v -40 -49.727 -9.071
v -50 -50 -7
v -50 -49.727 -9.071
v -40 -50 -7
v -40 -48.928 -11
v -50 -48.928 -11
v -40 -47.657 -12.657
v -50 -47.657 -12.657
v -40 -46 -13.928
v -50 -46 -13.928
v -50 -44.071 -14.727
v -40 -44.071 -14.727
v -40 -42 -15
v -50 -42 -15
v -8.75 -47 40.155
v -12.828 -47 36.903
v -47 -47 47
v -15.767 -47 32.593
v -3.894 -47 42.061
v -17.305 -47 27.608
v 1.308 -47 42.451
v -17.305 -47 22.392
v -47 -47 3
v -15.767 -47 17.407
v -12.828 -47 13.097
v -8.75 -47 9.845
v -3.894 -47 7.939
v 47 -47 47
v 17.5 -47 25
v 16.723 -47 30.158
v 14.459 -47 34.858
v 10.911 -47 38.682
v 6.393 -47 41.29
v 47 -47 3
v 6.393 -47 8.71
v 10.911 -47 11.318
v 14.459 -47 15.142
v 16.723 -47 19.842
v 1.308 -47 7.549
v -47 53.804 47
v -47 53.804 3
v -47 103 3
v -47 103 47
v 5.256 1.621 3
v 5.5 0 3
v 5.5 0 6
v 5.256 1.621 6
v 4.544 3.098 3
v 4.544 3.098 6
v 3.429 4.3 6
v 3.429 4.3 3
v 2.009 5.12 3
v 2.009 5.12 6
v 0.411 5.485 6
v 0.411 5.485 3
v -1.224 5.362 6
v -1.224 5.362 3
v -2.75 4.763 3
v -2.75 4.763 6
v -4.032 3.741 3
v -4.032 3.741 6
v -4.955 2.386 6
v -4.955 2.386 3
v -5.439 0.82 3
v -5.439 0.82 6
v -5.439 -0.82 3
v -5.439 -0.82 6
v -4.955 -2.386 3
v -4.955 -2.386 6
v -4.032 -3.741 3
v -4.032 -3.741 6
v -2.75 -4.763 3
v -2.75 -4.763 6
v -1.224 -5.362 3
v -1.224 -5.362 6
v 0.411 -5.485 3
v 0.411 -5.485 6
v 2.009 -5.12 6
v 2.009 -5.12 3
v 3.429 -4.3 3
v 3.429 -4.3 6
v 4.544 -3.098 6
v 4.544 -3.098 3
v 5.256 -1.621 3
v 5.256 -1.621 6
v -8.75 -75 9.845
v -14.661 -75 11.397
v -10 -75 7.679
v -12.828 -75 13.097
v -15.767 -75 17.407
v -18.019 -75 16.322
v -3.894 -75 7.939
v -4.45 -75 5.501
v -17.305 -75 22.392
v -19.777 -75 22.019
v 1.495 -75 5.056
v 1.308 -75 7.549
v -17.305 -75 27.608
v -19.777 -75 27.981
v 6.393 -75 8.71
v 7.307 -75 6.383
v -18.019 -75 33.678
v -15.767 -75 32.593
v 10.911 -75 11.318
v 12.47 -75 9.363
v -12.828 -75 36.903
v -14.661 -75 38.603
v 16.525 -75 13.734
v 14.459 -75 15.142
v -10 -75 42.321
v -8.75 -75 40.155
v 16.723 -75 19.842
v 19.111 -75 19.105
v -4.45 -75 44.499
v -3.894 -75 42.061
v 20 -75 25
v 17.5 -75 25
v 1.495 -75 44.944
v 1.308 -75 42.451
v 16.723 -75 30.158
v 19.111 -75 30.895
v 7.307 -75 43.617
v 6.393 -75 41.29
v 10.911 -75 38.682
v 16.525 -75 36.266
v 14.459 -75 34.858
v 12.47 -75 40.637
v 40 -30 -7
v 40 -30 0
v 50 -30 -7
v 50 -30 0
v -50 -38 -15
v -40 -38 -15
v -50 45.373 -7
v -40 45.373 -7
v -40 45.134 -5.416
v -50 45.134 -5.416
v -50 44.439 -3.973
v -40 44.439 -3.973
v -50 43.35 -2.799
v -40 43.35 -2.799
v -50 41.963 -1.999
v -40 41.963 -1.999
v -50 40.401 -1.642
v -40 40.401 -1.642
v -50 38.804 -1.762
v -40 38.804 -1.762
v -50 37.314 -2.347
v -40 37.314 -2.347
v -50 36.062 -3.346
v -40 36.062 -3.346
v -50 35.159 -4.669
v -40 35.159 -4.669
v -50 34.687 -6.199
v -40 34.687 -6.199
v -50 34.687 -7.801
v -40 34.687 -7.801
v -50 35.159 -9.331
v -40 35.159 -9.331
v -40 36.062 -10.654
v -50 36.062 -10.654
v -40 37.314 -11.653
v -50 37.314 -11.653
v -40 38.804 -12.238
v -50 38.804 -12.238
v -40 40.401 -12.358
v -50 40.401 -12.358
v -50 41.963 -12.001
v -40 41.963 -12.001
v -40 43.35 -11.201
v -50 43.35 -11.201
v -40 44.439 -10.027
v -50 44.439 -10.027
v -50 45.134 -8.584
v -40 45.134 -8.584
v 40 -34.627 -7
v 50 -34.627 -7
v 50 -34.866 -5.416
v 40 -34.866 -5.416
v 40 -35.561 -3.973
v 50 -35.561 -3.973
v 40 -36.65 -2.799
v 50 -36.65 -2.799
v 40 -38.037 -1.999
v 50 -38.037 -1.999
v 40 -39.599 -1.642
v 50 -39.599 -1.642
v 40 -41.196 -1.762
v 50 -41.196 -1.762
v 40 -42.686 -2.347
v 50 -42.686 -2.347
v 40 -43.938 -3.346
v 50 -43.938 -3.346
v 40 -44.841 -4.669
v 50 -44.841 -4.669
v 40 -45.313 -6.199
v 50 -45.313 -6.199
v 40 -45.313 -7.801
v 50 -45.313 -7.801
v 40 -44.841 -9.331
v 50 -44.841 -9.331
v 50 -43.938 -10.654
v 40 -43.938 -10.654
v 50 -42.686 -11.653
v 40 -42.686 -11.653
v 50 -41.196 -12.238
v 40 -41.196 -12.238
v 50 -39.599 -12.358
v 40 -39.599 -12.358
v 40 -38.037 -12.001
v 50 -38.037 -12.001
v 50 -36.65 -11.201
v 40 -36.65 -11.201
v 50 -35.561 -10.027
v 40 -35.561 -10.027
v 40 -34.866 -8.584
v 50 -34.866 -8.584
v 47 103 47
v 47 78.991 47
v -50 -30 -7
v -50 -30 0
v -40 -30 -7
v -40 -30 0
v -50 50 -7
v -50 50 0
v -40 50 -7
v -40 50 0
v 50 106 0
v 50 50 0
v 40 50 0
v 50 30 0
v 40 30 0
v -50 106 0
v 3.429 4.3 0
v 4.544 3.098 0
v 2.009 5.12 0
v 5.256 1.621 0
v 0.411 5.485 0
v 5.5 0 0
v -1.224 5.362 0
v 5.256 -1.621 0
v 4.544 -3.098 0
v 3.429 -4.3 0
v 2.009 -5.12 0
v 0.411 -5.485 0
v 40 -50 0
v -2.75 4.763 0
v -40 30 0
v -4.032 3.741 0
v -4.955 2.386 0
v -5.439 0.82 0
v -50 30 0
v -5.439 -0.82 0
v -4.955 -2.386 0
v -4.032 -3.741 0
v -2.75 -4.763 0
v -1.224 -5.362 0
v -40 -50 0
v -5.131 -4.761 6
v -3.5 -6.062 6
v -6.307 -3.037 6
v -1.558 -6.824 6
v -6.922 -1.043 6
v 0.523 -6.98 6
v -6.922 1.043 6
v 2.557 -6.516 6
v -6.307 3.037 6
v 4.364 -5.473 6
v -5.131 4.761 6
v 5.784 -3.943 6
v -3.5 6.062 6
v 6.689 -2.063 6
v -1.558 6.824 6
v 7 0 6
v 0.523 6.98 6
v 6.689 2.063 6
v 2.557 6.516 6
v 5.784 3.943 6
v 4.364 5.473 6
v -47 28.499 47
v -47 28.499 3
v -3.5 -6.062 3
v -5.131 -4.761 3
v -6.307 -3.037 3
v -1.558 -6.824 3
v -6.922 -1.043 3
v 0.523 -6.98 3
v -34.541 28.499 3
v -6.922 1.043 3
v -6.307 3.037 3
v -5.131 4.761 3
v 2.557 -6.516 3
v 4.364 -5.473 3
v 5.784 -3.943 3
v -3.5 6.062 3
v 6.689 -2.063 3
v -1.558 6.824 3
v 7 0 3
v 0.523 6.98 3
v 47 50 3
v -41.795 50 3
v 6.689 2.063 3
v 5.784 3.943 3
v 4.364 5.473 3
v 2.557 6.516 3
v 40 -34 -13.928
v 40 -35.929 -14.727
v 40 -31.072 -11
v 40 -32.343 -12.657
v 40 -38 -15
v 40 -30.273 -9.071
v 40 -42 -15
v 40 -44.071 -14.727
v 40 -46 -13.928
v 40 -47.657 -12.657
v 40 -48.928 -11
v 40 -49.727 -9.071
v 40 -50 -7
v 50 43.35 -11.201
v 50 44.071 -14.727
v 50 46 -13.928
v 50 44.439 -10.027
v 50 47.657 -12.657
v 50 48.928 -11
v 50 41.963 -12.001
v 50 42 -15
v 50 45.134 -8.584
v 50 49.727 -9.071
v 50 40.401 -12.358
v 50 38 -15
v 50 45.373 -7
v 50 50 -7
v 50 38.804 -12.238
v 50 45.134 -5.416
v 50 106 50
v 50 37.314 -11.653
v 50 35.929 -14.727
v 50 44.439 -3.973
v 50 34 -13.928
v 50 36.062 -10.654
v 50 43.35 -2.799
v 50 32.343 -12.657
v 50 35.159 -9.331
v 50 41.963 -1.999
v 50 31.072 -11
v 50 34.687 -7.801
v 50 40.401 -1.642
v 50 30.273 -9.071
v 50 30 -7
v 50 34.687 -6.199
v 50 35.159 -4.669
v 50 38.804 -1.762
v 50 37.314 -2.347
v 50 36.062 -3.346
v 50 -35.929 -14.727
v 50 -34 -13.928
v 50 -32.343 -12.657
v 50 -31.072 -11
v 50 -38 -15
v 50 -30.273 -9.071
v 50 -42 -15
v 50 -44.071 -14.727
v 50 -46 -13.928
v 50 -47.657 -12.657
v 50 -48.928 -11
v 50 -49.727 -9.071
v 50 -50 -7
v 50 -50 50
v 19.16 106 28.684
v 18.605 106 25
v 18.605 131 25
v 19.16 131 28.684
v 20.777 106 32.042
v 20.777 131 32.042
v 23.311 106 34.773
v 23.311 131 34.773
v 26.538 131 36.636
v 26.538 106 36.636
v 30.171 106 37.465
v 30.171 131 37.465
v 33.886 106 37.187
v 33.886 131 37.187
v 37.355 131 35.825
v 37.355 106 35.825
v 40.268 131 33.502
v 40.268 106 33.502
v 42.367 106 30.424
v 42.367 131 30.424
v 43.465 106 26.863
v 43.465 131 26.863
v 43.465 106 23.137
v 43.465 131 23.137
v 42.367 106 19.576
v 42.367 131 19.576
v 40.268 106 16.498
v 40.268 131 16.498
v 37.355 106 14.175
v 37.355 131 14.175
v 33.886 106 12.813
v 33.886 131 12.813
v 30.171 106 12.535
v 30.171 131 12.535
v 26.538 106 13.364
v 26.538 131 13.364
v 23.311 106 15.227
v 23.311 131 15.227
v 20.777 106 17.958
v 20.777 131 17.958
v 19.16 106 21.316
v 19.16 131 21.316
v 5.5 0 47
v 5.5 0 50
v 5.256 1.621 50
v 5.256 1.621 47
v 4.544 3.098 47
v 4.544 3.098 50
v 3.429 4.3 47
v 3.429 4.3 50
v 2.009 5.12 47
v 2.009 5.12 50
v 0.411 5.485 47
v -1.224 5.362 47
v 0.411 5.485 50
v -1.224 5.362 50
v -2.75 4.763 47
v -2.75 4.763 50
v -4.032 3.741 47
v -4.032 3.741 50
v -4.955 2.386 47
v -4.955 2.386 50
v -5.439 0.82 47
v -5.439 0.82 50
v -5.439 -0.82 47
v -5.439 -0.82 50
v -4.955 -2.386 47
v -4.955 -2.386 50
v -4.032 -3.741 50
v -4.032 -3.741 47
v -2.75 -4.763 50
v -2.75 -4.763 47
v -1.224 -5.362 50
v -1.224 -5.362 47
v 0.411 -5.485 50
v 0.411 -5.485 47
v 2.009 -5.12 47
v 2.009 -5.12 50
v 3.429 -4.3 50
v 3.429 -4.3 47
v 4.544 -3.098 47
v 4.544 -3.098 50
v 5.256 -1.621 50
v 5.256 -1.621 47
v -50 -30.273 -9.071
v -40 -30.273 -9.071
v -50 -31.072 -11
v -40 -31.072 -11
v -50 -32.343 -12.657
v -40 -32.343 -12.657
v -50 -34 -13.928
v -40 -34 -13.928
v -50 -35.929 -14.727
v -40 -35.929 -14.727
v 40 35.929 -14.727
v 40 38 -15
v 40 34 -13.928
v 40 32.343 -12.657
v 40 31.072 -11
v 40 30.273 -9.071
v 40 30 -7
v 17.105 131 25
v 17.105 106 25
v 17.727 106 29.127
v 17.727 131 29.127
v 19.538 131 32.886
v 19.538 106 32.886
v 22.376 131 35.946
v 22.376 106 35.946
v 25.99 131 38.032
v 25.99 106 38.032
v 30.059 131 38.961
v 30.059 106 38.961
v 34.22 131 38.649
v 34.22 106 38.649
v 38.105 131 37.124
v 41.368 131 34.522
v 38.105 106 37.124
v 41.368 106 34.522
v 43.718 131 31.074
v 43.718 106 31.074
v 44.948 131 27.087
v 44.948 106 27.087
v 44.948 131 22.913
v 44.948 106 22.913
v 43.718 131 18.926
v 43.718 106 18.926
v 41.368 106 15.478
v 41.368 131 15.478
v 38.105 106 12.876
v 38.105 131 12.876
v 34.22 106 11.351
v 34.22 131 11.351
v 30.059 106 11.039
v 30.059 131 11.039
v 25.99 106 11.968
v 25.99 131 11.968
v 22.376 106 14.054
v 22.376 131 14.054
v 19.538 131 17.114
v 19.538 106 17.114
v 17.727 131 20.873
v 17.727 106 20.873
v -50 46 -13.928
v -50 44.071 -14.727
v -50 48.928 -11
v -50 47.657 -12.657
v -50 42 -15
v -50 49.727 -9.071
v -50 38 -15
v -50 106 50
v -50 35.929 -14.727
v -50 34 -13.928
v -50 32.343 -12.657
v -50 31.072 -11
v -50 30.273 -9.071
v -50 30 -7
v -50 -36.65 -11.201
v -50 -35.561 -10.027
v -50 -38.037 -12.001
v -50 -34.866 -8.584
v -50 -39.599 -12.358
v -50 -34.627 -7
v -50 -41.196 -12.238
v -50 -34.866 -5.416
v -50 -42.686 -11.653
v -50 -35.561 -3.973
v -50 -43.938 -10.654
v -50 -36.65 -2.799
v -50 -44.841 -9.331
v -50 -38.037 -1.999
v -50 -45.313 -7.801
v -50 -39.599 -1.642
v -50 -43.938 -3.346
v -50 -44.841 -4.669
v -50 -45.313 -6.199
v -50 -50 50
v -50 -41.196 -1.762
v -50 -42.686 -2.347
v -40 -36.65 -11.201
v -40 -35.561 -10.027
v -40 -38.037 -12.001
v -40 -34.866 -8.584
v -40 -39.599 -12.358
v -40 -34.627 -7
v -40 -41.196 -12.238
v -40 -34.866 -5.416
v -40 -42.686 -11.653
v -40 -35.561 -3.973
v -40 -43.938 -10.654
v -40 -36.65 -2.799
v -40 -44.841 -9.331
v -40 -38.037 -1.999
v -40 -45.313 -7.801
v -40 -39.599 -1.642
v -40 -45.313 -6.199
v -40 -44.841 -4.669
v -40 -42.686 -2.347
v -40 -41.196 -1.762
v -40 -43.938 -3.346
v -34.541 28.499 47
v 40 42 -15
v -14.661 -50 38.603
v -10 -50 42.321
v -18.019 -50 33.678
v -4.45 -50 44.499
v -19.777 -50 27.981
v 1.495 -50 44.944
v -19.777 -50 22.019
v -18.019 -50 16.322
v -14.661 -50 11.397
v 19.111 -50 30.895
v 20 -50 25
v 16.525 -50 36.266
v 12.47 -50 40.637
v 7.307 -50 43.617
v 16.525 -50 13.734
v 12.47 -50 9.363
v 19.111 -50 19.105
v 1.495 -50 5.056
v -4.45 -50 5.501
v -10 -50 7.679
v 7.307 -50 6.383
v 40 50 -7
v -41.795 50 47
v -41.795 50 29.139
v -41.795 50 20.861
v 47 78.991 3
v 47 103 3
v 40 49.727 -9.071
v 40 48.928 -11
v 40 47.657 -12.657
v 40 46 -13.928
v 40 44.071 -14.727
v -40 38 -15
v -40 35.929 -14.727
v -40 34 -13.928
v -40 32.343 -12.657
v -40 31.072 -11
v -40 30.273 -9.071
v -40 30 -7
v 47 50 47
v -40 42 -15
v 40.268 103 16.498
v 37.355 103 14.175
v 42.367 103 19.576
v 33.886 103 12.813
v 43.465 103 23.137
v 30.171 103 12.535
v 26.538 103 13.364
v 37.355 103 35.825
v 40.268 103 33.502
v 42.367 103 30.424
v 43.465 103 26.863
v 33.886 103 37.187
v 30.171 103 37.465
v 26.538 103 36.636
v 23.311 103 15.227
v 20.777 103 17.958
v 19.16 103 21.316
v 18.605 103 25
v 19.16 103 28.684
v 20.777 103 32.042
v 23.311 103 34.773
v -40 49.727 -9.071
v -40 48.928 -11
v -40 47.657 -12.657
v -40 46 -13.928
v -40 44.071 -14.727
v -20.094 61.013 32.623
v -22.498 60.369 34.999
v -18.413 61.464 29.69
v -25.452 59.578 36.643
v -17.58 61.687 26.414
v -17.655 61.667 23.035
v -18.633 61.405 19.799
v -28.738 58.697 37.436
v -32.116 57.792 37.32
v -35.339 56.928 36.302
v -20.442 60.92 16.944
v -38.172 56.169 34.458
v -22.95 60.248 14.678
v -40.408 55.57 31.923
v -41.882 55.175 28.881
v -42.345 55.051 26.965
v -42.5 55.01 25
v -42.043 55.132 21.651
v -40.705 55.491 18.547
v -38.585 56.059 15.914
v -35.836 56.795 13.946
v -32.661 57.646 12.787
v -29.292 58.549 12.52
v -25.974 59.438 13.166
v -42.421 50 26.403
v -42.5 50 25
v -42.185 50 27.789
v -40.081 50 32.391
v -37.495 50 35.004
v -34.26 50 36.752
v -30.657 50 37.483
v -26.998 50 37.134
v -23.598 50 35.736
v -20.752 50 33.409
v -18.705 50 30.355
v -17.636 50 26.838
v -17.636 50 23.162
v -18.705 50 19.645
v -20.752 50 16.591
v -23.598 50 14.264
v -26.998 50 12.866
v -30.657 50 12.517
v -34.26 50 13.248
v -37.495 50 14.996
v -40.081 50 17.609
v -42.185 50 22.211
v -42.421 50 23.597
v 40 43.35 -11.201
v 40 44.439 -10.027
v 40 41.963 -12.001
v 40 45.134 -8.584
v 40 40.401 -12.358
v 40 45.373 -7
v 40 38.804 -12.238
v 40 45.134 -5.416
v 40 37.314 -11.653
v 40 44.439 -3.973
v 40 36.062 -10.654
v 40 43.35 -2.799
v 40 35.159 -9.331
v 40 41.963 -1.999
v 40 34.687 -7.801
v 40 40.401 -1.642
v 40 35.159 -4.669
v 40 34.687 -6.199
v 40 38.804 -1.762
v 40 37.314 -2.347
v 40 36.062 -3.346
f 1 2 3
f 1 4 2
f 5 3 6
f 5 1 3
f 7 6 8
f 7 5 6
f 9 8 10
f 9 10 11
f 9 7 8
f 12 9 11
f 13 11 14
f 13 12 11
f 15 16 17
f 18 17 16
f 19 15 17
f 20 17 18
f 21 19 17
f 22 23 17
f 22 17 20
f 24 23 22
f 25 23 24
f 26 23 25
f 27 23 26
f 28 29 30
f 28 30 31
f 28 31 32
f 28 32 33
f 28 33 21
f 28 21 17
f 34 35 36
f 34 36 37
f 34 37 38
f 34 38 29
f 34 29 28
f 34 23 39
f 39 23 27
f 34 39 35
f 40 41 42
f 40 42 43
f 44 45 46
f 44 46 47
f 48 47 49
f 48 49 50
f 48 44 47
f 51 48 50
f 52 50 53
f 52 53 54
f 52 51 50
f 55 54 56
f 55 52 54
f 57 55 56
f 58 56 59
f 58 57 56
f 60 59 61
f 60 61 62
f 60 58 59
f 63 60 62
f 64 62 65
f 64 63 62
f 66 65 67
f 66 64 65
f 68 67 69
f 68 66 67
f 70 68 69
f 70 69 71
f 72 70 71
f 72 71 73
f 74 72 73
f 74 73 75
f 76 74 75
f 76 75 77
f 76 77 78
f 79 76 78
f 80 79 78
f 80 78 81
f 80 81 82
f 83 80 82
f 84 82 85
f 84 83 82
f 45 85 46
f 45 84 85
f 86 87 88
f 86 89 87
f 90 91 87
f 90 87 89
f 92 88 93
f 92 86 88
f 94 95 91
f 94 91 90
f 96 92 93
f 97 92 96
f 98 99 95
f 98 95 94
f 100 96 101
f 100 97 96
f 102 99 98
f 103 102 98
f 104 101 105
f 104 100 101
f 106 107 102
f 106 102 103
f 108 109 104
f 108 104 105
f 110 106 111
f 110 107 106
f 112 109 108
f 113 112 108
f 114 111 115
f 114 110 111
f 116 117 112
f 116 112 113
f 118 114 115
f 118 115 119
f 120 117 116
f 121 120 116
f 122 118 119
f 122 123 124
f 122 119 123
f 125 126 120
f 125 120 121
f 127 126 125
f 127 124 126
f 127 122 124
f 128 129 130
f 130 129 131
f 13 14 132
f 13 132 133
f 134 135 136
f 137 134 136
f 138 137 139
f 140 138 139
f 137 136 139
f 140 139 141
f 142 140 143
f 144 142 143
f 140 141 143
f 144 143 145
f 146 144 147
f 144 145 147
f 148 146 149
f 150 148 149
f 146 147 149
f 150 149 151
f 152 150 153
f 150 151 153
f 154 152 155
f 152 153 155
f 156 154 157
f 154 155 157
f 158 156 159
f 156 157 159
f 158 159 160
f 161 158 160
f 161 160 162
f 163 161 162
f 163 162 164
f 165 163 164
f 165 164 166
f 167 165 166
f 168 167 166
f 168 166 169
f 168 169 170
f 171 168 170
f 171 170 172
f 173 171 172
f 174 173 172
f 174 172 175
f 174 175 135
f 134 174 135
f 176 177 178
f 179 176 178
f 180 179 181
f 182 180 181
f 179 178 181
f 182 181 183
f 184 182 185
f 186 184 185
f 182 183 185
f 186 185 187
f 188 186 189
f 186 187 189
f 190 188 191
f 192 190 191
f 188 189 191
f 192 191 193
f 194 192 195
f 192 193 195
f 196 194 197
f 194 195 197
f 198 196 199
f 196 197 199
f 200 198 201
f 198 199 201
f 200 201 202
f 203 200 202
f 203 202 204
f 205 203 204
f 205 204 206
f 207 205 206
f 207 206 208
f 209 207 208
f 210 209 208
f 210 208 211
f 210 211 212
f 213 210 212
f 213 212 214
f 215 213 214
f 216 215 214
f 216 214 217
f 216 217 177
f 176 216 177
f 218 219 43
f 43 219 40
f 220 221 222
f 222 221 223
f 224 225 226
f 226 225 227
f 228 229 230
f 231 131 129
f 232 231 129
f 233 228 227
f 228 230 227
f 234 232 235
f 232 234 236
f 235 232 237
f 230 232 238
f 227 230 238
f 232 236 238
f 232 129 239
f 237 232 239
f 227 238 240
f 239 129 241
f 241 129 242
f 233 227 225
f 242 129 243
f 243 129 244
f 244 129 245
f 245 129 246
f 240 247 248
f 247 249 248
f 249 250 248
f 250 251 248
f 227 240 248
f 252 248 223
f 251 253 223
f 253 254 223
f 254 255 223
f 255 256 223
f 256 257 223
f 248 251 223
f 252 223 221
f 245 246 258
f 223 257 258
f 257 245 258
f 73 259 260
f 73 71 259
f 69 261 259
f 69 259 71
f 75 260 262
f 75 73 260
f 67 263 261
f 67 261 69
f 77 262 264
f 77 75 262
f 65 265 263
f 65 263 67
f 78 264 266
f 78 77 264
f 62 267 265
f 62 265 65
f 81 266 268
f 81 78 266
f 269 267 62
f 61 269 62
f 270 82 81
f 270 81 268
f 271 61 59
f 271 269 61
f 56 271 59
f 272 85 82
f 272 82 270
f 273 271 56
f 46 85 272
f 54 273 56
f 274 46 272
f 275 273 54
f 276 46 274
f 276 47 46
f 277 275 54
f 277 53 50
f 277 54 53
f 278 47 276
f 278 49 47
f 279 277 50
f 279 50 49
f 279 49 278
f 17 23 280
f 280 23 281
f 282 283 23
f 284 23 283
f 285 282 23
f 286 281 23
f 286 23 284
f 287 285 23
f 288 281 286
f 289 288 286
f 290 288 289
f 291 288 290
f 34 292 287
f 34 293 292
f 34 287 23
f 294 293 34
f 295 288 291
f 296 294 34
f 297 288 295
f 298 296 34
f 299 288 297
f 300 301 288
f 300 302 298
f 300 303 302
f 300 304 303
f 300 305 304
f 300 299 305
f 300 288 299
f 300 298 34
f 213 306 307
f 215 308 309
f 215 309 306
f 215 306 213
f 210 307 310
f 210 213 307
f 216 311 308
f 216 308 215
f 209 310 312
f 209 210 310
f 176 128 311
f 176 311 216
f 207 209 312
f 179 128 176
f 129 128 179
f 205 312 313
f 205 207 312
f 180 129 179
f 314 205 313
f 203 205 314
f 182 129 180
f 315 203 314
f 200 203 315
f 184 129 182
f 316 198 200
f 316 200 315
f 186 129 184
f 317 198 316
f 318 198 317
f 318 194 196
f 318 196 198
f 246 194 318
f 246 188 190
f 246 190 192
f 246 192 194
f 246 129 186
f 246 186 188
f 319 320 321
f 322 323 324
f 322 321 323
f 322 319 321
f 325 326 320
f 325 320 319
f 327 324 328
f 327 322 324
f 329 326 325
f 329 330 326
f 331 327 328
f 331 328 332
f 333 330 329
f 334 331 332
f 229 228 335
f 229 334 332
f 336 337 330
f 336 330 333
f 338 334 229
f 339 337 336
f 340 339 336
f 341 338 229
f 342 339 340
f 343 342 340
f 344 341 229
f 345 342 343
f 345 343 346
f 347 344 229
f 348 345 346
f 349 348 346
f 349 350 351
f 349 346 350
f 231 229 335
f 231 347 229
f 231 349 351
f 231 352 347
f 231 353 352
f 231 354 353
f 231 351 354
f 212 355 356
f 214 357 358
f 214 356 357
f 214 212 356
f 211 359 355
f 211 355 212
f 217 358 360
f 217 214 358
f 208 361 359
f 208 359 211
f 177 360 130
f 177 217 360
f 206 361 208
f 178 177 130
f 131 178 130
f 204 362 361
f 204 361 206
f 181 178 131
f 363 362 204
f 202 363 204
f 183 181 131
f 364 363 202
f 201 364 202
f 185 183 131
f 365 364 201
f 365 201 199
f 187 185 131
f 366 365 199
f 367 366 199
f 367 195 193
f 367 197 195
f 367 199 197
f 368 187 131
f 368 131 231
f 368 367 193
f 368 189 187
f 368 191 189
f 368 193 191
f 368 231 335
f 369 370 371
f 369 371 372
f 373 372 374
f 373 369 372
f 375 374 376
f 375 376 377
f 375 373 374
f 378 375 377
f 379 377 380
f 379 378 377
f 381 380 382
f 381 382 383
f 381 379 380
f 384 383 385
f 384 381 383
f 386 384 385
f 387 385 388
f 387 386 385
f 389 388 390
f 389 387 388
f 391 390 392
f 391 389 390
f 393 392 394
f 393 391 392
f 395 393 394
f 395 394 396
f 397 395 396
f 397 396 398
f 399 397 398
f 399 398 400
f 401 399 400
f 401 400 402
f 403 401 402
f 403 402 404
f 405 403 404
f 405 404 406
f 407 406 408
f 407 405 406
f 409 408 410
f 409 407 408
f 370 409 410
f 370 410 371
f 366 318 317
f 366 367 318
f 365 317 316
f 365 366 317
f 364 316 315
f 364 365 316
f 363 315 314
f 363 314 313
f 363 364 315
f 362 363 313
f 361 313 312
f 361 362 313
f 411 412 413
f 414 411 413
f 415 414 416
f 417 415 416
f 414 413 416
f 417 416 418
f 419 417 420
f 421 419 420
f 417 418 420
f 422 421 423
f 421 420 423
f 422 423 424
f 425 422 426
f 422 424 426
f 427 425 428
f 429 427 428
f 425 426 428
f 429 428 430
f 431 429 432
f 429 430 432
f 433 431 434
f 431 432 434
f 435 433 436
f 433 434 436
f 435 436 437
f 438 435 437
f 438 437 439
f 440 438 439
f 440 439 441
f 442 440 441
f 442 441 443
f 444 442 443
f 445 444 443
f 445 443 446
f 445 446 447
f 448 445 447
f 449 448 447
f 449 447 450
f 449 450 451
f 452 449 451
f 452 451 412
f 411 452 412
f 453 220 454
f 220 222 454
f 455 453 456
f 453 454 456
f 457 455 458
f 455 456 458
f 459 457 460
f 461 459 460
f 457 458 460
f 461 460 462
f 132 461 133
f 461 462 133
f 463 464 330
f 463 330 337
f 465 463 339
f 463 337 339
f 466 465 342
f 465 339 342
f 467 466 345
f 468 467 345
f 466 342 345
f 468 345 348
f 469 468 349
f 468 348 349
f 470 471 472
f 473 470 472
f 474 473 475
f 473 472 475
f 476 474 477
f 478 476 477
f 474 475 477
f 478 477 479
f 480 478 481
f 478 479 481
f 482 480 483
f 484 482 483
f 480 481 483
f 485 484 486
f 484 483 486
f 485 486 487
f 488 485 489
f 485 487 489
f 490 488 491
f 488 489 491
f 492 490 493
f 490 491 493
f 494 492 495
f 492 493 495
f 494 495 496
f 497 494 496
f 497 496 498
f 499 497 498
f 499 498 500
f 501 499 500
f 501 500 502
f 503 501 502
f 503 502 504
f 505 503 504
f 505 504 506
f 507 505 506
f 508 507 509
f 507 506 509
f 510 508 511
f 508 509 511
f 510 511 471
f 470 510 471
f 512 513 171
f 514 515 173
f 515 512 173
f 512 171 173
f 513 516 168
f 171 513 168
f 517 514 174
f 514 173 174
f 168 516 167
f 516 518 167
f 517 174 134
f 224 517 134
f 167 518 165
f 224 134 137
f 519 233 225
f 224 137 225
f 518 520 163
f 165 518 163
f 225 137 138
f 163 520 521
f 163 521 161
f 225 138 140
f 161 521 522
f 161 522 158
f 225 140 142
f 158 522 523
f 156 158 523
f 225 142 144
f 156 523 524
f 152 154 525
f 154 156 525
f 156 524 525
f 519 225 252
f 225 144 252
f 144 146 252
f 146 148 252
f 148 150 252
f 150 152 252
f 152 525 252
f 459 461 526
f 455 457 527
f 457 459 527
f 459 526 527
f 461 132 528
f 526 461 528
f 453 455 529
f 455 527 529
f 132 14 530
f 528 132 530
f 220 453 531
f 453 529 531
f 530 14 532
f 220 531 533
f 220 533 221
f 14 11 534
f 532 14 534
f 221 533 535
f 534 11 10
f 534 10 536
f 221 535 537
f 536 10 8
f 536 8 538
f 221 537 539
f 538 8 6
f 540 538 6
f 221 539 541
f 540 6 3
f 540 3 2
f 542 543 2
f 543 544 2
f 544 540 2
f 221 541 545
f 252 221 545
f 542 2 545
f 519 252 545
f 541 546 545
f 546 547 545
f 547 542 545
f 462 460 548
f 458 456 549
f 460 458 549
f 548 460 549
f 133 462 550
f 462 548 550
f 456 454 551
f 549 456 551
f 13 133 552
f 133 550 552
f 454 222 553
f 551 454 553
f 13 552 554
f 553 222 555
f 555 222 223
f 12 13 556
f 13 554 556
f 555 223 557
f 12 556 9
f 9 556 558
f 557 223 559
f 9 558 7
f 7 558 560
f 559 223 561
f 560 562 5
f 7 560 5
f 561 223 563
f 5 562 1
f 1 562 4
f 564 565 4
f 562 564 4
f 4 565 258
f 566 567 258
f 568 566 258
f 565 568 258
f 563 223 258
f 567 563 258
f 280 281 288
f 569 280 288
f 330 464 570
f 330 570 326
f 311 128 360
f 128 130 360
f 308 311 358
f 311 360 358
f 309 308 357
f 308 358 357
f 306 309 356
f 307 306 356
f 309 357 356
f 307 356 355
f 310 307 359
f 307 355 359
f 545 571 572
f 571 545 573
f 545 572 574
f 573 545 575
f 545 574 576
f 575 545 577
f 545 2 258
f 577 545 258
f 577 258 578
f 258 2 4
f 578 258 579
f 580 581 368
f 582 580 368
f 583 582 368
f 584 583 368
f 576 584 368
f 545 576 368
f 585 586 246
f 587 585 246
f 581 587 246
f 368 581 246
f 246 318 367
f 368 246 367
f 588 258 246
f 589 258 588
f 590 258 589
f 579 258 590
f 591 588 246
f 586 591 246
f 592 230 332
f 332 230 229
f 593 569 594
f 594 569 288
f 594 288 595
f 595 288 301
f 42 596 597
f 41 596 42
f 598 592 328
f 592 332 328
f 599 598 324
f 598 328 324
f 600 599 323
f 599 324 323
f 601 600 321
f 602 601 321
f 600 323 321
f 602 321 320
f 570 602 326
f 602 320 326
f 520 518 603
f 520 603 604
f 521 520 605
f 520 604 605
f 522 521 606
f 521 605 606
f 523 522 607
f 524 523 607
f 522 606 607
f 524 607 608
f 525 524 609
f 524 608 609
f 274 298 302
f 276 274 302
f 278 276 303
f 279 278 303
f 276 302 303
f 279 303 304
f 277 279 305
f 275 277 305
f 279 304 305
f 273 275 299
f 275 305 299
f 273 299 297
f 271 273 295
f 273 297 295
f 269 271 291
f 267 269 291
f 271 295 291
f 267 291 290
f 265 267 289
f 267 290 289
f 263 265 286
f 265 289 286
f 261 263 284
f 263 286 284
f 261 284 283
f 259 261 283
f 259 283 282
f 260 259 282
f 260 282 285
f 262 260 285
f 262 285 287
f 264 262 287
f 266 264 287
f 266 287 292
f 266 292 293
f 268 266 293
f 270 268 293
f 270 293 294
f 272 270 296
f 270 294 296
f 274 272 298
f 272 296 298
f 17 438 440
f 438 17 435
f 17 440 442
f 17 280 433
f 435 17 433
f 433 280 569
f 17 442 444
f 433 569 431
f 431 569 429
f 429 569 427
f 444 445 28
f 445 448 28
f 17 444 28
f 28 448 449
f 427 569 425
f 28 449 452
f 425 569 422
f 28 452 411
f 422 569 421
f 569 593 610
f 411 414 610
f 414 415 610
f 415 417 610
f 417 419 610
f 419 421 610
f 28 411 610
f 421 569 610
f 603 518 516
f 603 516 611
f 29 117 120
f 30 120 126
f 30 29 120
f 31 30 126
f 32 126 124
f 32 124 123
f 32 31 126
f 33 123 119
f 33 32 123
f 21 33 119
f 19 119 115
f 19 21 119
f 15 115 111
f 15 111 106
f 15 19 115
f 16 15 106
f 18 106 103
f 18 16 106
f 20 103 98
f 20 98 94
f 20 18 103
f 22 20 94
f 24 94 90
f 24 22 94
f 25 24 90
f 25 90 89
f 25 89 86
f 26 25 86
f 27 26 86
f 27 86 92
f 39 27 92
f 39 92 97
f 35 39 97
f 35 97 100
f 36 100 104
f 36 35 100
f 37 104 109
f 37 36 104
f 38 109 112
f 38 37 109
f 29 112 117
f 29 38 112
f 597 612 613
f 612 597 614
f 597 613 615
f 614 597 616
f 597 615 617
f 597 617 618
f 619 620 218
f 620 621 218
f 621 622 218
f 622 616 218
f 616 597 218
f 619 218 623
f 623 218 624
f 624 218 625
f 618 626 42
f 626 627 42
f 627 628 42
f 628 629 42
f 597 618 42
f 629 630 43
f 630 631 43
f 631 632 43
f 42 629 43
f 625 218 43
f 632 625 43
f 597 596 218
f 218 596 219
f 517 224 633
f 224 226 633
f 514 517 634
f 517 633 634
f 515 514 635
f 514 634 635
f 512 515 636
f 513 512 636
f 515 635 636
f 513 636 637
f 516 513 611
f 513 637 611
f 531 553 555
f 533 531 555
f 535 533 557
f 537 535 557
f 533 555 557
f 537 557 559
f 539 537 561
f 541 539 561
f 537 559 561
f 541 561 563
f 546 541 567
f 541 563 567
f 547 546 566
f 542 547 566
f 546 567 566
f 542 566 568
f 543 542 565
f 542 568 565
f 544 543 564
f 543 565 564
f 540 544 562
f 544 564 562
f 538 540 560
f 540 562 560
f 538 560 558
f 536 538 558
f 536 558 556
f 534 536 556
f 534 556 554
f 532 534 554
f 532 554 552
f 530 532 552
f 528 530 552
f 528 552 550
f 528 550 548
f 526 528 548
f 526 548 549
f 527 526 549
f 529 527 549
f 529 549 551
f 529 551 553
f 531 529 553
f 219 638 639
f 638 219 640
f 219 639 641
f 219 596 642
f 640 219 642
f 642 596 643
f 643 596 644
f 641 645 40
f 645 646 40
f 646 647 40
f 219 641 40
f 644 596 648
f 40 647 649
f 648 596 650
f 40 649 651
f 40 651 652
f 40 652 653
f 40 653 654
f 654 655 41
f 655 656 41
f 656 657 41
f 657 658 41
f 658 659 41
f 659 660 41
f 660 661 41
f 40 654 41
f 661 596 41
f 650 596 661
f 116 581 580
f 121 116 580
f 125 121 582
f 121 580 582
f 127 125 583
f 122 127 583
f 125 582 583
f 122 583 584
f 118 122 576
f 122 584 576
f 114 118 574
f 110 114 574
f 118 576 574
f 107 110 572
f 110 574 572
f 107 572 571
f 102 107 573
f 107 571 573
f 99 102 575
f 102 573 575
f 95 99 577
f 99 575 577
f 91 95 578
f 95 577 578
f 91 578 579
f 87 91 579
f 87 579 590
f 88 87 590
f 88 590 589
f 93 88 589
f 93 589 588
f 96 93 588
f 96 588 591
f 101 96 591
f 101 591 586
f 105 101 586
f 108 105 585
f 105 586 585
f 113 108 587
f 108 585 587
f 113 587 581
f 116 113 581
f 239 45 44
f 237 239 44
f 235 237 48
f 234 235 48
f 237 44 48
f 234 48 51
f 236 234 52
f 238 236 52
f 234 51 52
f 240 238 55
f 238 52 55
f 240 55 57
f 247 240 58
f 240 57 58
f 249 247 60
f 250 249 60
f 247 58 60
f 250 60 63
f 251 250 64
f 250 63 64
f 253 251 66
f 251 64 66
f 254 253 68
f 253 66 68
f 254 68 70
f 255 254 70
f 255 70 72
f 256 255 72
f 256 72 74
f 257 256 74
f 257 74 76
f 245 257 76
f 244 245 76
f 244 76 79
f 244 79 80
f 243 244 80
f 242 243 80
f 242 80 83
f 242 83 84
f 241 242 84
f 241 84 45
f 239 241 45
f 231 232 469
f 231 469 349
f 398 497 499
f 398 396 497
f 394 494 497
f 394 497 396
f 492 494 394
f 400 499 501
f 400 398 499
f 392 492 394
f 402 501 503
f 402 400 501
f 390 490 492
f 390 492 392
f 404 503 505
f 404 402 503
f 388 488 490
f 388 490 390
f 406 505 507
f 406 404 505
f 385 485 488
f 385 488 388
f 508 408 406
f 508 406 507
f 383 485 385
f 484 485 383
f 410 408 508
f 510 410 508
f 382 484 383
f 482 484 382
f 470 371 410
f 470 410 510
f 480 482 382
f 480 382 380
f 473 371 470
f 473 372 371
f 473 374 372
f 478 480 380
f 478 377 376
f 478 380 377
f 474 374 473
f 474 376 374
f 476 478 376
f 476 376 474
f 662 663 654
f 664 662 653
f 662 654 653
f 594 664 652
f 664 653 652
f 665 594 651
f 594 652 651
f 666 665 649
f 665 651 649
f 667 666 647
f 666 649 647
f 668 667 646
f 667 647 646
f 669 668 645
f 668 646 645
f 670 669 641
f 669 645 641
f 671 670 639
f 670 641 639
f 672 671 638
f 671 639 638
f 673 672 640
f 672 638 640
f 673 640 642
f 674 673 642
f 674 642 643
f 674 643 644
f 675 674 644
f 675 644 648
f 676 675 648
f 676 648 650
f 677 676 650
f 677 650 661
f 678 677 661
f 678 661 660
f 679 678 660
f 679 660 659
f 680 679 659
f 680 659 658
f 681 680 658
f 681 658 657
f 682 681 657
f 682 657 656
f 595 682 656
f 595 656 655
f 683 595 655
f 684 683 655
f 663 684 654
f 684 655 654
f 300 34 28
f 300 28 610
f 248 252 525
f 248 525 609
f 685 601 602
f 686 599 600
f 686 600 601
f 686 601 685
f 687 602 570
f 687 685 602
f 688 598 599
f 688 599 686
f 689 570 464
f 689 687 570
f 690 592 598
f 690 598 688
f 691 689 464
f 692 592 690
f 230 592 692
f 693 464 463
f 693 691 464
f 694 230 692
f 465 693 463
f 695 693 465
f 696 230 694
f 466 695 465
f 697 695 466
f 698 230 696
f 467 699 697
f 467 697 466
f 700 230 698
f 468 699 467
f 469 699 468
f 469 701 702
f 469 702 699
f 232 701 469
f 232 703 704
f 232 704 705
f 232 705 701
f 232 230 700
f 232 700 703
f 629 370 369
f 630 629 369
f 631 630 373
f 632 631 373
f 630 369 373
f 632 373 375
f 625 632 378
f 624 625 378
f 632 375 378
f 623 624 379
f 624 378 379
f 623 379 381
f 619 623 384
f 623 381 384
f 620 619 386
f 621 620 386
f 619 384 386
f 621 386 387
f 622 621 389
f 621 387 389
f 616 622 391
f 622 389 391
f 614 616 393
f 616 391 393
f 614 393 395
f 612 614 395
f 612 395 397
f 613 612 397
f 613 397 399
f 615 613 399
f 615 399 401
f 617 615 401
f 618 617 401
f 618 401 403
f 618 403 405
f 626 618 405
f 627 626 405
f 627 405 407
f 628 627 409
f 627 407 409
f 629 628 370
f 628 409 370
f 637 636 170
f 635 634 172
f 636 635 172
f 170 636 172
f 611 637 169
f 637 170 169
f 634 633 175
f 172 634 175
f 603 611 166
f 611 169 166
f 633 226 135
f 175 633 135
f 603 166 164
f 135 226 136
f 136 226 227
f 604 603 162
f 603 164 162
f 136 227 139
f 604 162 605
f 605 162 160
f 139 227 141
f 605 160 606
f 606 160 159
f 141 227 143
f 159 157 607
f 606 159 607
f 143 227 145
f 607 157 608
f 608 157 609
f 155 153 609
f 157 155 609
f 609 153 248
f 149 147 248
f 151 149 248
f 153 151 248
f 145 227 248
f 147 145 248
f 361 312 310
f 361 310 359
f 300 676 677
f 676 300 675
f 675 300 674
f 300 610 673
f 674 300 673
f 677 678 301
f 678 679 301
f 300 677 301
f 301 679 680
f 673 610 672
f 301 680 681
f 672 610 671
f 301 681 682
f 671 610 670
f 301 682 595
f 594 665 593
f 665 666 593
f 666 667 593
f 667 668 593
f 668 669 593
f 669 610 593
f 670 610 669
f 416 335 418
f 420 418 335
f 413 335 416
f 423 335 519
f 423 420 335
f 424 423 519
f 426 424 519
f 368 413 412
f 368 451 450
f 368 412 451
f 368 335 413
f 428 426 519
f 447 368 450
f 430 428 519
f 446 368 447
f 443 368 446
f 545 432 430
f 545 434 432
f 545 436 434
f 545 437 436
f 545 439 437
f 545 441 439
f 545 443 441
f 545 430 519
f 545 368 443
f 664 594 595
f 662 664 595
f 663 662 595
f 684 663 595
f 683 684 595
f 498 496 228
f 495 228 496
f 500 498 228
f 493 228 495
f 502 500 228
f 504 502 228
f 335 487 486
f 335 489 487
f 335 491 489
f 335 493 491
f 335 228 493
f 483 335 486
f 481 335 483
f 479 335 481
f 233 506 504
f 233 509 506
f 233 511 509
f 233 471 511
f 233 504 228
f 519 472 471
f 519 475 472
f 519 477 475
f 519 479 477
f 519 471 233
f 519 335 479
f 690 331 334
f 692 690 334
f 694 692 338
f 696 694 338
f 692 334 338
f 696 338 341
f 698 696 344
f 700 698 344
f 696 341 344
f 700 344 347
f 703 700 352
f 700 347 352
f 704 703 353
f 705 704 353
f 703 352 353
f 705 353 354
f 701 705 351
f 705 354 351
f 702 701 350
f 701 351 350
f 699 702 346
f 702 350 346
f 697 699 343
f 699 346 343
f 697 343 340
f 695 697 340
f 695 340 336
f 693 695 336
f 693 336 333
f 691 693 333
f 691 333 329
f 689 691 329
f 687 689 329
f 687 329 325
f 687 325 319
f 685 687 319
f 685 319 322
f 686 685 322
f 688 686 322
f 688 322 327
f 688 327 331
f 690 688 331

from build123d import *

# Parameters (mm, degrees)
F0_W      = 100
F0_H      = 100
F1_DEPTH  = 50
F2_T      = -3
F3_R      = 5.5
F4_DEPTH  = 50
F5_R      = 20
F5_R_2    = 17.5
F6_DEPTH  = 25
F7_DEPTH  = 3
F8_W      = 10
F8_H      = 20
F9_DEPTH  = 15
F10_R     = 5.3726460022
F11_DEPTH = 100
F12_R     = 8
F13_R     = 7
F13_R_2   = 5.5
F14_DEPTH = 3
F15_W     = 100
F15_H     = 50
F16_DEPTH = 3
F18_DEPTH = 50
F20_W     = 100
F20_H     = 50
F20_W_2   = 94
F20_H_2   = 44
F21_DEPTH = 50
F22_R     = 12.5
F23_DEPTH = 53
F24_W     = 100
F24_H     = 50
F25_DEPTH = 3
F26_R     = 14
F26_R_2   = 12.5
F27_DEPTH = 25
F28_DEPTH = 3
F30_DEPTH = 44


with BuildPart() as f1:
    # F0 (on Top) → F1 (new body)
    with BuildSketch(Plane.XY):
        Rectangle(F0_W, F0_H)
    extrude(amount=F1_DEPTH)

    # F2
    f2_openings = [f1.faces().sort_by_distance(p)[0] for p in [
        (0, 50, 25),
    ]]
    offset(amount=F2_T, openings=f2_openings)

    # F3 (on face) → F4 (cut, through all)
    with BuildSketch(Plane.XY.offset(50)):
        Circle(F3_R)
    extrude(amount=-F4_DEPTH, mode=Mode.SUBTRACT)

    # F5 (on face) → F6 (join)
    with BuildSketch(Plane.XZ.offset(50)):
        with Locations((0, 25)):
            Circle(F5_R)
        with Locations((0, 25)):
            Circle(F5_R_2, mode=Mode.SUBTRACT)
    extrude(amount=F6_DEPTH)

    # F5 (on face) → F7 (cut, through all)
    with BuildSketch(Plane.XZ.offset(50)):
        with Locations((0, 25)):
            Circle(F5_R_2)
    extrude(amount=-F7_DEPTH, mode=Mode.SUBTRACT)

    # F8 (on face) → F9 (join)
    with BuildSketch(Plane(origin=(0, 0, 0), x_dir=(1, 0, 0), z_dir=(0, 0, -1))):
        with Locations((45, -40)):
            Rectangle(F8_W, F8_H)
        with Locations((-45, -40)):
            Rectangle(F8_W, F8_H)
        with Locations((-45, 40)):
            Rectangle(F8_W, F8_H)
        with Locations((45, 40)):
            Rectangle(F8_W, F8_H)
    extrude(amount=F9_DEPTH)

    # F10 (on face) → F11 (cut, through all)
    with BuildSketch(Plane.YZ.offset(50)):
        with Locations((40, -7)):
            Circle(F10_R)
        with Locations((-40, -7)):
            Circle(F10_R)
    extrude(amount=-F11_DEPTH, mode=Mode.SUBTRACT)

    # F12
    f12_edges = [f1.edges().sort_by_distance(p)[0] for p in [
        (45, 30, -15),
        (45, 50, -15),
        (-45, 50, -15),
        (-45, 30, -15),
        (45, -50, -15),
        (45, -30, -15),
        (-45, -50, -15),
        (-45, -30, -15),
    ]]
    fillet(f12_edges, radius=F12_R)

    # F13 (on face) → F14 (join)
    with BuildSketch(Plane.XY.offset(3)):
        Circle(F13_R)
        Circle(F13_R_2, mode=Mode.SUBTRACT)
    extrude(amount=F14_DEPTH)

    # F15 (on face) → F16 (join)
    with BuildSketch(Plane(origin=(0, 50, 0), x_dir=(-1, 0, 0), z_dir=(0, 1, 0))):
        with Locations((0, 25)):
            Rectangle(F15_W, F15_H)
    extrude(amount=F16_DEPTH)

    # F17 (on Top) → F18 (join, through all)
    with BuildSketch(Plane.XY):
        Polygon((-50, 53), (50, 53), (50, 79.7949192431), align=None)
    extrude(amount=F18_DEPTH)

    # F20 (on face) → F21 (join)
    with BuildSketch(Plane(origin=(0, 53, 0), x_dir=(-1, 0, 0), z_dir=(0, 1, 0))):
        with Locations((0, 25)):
            Rectangle(F20_W, F20_H)
        with Locations((0, 25)):
            Rectangle(F20_W_2, F20_H_2, mode=Mode.SUBTRACT)
    extrude(amount=F21_DEPTH)

    # F22 (on face) → F23 (cut, through all)
    with BuildSketch(Plane(origin=(0, 103, 0), x_dir=(-1, 0, 0), z_dir=(0, 1, 0))):
        with Locations((30, 25)):
            Circle(F22_R)
    extrude(amount=-F23_DEPTH, mode=Mode.SUBTRACT)

    # F24 (on face) → F25 (join)
    with BuildSketch(Plane(origin=(0, 103, 0), x_dir=(-1, 0, 0), z_dir=(0, 1, 0))):
        with Locations((0, 25)):
            Rectangle(F24_W, F24_H)
    extrude(amount=F25_DEPTH)

    # F26 (on face) → F27 (join)
    with BuildSketch(Plane(origin=(0, 106, 0), x_dir=(-1, 0, 0), z_dir=(0, 1, 0))):
        with Locations((-31.1048589647, 25)):
            Circle(F26_R)
        with Locations((-31.1048589647, 25)):
            Circle(F26_R_2, mode=Mode.SUBTRACT)
    extrude(amount=F27_DEPTH)

    # F28 (cut, through all): a face of the model
    f28_faces = [f1.faces().sort_by_distance(p)[0] for p in [
        (31.1048589647, 106, 25),
    ]]
    extrude(f28_faces, amount=-F28_DEPTH, mode=Mode.SUBTRACT)

    # F29 (on face) → F30 (join, through all)
    with BuildSketch(Plane.XY.offset(3)):
        Polygon((-34.5411077142, 28.4994188696), (-41.7947806418, 50), (-47, 50), (-47, 28.4994188696), align=None)
    extrude(amount=F30_DEPTH)


solid = f1.part
